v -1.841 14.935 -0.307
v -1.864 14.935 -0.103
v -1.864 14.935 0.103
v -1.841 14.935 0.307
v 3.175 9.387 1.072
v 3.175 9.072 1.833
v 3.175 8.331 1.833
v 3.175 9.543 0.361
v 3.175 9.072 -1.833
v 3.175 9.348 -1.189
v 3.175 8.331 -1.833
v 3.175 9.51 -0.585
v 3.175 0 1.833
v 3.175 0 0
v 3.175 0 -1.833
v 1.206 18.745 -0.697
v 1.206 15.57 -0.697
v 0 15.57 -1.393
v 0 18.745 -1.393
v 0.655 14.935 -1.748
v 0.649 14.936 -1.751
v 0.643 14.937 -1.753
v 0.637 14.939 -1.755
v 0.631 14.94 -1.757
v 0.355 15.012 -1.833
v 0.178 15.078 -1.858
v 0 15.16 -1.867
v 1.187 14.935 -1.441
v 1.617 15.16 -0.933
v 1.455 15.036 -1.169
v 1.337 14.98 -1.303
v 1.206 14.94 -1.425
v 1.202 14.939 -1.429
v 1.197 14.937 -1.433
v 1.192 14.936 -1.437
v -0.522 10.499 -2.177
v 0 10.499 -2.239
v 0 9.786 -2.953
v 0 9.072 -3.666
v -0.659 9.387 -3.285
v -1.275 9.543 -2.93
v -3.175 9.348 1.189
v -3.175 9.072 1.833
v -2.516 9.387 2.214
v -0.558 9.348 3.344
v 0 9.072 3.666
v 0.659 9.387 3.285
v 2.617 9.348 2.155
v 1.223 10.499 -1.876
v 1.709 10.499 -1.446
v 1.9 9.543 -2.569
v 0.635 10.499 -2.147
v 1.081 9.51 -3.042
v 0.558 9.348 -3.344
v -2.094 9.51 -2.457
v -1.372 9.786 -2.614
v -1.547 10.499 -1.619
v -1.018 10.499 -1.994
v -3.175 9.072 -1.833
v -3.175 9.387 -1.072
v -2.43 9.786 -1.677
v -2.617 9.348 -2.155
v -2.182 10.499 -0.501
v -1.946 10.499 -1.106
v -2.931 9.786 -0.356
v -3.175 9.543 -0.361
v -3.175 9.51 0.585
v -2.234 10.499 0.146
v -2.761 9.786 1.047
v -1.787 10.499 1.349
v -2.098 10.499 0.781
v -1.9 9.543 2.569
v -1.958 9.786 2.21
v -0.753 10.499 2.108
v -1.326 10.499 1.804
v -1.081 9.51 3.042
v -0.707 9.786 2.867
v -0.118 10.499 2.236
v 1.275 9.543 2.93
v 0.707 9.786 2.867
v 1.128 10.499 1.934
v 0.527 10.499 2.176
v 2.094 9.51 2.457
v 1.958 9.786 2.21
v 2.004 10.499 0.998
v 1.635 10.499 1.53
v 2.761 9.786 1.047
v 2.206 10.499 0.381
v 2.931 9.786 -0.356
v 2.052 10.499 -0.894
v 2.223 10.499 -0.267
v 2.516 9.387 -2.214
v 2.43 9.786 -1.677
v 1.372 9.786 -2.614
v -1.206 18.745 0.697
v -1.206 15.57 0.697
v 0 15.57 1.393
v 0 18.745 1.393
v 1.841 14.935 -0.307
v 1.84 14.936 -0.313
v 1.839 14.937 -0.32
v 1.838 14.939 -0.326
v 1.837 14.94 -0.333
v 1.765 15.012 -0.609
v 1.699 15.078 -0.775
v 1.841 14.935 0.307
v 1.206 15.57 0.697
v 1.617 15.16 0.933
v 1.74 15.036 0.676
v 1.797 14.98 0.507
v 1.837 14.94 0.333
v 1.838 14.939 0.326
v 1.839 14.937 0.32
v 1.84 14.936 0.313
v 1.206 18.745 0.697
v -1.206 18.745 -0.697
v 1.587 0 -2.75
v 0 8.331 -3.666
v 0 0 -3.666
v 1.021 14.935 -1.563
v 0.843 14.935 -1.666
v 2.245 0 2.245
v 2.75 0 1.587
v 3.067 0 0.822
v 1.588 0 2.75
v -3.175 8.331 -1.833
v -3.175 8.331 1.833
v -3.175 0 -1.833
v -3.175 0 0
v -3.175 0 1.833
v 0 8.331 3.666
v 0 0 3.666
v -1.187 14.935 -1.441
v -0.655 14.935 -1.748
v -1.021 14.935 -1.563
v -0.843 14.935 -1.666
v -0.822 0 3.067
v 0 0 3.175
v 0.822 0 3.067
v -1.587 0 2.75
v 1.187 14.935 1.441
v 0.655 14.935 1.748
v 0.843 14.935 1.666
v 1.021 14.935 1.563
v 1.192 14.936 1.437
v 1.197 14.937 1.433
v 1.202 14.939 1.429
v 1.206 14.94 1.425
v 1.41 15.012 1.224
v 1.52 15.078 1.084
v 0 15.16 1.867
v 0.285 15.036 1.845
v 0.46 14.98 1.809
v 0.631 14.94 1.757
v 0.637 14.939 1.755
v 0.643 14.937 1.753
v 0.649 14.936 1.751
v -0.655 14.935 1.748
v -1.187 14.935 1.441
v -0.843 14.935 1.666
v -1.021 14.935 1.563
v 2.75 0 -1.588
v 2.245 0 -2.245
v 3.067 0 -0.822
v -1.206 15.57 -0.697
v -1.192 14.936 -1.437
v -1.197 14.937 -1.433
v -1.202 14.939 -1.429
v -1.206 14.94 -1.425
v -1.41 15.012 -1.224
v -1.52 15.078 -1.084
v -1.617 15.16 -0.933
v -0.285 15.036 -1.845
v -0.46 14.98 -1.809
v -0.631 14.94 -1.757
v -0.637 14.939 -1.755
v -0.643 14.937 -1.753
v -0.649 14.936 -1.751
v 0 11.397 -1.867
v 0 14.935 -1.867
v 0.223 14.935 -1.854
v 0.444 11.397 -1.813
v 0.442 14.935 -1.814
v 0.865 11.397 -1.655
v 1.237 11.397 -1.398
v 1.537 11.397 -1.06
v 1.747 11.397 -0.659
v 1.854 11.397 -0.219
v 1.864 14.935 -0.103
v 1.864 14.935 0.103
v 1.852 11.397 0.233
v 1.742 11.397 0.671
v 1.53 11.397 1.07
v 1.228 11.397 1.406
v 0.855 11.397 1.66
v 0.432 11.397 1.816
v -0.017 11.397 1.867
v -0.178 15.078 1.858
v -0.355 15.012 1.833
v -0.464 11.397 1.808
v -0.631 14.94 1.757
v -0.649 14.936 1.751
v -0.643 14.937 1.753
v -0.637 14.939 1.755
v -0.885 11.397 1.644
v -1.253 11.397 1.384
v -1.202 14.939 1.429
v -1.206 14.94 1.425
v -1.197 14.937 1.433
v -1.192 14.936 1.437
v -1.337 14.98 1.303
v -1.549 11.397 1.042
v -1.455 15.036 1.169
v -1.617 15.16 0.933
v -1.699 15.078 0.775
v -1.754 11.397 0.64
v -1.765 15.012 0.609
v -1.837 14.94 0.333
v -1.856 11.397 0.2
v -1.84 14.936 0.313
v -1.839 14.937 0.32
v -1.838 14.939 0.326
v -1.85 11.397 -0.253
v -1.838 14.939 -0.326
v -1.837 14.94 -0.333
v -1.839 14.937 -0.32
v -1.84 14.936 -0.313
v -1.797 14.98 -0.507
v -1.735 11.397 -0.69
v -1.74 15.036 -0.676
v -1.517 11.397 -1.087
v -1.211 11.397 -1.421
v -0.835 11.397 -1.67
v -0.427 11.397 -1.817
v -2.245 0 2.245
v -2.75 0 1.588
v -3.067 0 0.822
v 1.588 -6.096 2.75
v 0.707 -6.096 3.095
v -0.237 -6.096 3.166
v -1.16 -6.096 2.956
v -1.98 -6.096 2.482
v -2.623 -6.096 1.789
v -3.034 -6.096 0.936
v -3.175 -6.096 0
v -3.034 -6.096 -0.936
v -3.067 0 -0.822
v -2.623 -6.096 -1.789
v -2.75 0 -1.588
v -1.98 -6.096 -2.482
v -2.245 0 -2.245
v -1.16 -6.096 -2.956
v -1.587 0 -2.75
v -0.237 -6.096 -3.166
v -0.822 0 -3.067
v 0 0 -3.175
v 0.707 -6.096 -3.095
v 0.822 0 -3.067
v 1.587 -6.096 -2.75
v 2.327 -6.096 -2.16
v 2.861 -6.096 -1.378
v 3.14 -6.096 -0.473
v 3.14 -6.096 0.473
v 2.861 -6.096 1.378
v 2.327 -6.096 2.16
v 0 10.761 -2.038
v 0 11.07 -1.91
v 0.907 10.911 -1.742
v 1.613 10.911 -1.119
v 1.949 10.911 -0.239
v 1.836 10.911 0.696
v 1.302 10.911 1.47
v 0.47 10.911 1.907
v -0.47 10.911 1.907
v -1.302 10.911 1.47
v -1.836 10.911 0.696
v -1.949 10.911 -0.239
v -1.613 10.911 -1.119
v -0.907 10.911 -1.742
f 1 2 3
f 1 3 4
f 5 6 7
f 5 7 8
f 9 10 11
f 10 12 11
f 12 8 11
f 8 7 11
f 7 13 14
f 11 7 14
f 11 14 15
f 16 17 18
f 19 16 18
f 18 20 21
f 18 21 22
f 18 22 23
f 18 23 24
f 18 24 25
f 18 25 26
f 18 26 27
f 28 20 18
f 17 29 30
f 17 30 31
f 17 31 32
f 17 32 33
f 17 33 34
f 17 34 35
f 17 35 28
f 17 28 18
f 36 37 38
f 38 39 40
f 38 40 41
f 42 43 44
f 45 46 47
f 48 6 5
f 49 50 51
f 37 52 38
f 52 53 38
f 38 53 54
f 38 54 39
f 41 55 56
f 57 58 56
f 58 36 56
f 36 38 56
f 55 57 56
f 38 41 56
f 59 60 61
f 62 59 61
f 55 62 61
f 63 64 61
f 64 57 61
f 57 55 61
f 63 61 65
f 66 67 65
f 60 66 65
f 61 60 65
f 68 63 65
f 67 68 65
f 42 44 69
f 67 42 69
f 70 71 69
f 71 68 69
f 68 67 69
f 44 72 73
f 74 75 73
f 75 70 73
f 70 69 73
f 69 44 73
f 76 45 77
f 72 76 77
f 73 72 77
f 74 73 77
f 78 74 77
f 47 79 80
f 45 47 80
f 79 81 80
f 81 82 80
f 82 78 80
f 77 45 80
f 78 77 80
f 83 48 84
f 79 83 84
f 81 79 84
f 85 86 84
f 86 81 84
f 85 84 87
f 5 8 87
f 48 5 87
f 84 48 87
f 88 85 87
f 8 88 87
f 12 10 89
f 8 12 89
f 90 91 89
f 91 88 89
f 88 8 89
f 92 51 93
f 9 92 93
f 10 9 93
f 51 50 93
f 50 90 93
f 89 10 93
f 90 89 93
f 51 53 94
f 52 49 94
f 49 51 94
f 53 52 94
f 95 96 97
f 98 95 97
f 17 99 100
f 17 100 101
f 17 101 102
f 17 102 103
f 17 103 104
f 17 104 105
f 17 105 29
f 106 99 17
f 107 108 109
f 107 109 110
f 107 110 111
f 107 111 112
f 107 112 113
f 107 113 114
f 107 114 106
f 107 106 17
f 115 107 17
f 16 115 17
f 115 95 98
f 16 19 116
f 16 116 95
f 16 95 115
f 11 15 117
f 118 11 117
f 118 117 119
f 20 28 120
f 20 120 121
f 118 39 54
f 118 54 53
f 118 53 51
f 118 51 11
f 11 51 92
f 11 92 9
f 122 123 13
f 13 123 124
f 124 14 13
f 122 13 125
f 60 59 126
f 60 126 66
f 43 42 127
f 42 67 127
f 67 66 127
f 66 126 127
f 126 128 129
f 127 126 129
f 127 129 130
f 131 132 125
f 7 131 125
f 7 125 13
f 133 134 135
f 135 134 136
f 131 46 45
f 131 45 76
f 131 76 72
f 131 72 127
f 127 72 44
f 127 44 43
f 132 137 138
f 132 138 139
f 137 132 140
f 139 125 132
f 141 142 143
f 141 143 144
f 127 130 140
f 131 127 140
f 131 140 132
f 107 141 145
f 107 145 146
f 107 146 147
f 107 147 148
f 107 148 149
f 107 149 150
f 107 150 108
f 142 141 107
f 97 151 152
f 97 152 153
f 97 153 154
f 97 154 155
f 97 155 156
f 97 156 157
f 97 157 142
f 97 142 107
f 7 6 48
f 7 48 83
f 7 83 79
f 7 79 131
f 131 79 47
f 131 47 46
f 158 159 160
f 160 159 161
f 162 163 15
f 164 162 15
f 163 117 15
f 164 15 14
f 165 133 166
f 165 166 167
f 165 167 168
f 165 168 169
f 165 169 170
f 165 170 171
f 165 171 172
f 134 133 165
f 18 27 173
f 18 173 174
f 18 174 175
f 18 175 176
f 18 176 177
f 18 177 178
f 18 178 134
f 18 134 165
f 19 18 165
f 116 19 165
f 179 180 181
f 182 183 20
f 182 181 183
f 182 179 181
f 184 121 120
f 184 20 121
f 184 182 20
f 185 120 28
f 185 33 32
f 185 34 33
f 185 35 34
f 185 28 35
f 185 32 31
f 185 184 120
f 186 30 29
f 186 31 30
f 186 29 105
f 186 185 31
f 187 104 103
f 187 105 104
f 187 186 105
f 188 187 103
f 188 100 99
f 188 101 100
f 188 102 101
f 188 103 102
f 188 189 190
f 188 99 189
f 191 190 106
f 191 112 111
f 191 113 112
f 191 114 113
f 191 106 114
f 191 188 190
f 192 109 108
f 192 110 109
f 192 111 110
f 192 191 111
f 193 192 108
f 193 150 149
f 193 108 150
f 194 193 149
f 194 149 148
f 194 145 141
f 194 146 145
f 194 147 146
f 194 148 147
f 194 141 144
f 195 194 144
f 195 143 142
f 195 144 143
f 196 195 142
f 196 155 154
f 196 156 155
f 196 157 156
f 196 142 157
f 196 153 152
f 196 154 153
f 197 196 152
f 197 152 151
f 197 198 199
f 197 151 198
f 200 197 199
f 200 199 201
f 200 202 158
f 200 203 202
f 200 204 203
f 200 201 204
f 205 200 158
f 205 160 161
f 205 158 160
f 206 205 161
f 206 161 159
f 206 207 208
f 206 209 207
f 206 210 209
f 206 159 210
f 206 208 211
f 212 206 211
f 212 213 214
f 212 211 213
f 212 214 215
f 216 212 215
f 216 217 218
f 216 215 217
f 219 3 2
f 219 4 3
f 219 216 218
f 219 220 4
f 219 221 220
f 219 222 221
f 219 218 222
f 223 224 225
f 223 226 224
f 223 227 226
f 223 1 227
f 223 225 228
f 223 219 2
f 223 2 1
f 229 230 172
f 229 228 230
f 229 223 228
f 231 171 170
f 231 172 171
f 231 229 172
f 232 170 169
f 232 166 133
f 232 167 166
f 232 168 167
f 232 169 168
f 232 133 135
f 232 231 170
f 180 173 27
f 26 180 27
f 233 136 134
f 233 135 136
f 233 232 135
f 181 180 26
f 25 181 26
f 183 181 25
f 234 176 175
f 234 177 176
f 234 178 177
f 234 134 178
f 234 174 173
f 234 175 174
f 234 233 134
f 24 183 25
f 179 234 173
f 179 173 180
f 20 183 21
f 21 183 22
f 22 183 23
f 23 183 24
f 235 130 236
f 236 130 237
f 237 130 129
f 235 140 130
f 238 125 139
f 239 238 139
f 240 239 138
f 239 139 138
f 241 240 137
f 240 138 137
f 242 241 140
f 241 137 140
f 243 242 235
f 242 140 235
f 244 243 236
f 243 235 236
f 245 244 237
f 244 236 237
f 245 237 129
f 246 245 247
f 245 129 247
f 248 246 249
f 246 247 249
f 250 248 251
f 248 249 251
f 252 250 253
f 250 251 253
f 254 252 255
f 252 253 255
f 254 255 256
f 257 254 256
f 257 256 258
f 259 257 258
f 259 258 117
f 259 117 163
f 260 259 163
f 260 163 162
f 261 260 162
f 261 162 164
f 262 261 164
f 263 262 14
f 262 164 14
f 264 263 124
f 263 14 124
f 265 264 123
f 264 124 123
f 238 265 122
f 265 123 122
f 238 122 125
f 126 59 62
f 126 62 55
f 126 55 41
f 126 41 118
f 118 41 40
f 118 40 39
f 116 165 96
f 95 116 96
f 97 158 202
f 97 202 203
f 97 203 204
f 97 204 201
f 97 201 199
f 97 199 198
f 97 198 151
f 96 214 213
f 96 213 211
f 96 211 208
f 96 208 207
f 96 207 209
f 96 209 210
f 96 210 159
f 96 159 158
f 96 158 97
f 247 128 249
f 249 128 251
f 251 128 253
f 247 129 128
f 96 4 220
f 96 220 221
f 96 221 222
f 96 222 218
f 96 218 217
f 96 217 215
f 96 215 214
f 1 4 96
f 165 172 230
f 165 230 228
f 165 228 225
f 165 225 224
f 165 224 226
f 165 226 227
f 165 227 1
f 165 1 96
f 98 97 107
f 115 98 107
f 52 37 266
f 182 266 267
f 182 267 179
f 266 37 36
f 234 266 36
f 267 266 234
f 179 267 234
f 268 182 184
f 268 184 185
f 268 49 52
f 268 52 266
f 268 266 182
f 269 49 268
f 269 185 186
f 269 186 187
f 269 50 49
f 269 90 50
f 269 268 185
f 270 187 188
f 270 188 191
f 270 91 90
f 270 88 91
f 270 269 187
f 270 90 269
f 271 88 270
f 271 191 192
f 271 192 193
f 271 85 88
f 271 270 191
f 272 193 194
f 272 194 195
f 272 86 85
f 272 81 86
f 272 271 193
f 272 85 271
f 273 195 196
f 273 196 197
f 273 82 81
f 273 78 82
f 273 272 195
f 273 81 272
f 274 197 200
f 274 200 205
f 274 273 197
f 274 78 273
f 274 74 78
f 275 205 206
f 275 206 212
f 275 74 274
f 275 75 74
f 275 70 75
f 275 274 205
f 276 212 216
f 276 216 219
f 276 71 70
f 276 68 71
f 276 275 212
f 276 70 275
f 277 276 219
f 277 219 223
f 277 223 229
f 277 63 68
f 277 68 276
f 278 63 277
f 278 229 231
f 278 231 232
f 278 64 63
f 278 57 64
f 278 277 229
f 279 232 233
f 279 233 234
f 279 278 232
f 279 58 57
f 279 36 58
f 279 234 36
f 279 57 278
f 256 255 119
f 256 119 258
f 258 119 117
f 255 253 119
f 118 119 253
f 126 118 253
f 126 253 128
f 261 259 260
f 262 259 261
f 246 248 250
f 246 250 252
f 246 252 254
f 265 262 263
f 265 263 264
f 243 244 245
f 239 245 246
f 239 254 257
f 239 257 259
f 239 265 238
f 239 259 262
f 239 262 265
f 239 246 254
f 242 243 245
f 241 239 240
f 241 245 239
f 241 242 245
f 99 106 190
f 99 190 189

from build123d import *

# Parameters (mm, degrees)
BOSS_EXTRUDE1_DEPTH = 8.3312
SKETCH2_R           = 3.175
BOSS_EXTRUDE2_DEPTH = 6.096
SKETCH3_R           = 1.8669
BOSS_EXTRUDE3_DEPTH = 6.604
BOSS_EXTRUDE4_DEPTH = 3.81
CHAMFER1_SIZE       = 0.635
FILLET2_R           = 1.27


with BuildPart() as part:
    # Sketch1 → Boss-Extrude1 (new body)
    with BuildSketch(Plane(origin=(0, 0, 0), x_dir=(1, 0, 0), z_dir=(0, 1, 0))):
        Polygon((0, 3.666174209), (-3.175, 1.833087105), (-3.175, -1.833087105), (0, -3.666174209), (3.175, -1.833087105), (3.175, 1.833087105), align=None)
    extrude(amount=BOSS_EXTRUDE1_DEPTH)

    # Sketch2 → Boss-Extrude2 (add)
    with BuildSketch(Plane.XZ):
        with Locations(Location((0, 0, 0), (0, 0, 60))):
            Circle(SKETCH2_R)
    extrude(amount=BOSS_EXTRUDE2_DEPTH)

    # Sketch3 → Boss-Extrude3 (add)
    with BuildSketch(Plane(origin=(0, 8.3312, 0), x_dir=(1, 0, 0), z_dir=(0, 1, 0))):
        with Locations(Location((0, 0, 0), (0, 0, 90))):
            Circle(SKETCH3_R)
    extrude(amount=BOSS_EXTRUDE3_DEPTH)

    # Sketch4 → Boss-Extrude4 (add)
    with BuildSketch(Plane(origin=(0, 14.9352, 0), x_dir=(1, 0, 0), z_dir=(0, 1, 0))):
        Polygon((0, 1.3931462), (-1.2065, 0.6965731), (-1.2065, -0.6965731), (0, -1.3931462), (1.2065, -0.6965731), (1.2065, 0.6965731), align=None)
    extrude(amount=BOSS_EXTRUDE4_DEPTH)

    # Chamfer1
    # the kernel refuses this chamfer: 0.635 mm, written as the material it adds along each edge
    with BuildSketch(Plane(origin=(2.620735677, 14.9352, 0.119936249), x_dir=(0.4998109584556484, -0.027495876610587288, -0.8656979742248804), z_dir=(-0.8660254037844387, 0, -0.5000000000000001))) as chamfer1_piece_1_section:
        Polygon((CHAMFER1_SIZE * 0.999621916911, -CHAMFER1_SIZE * 0.0274958766106), (-CHAMFER1_SIZE * 0.0274958766106, -CHAMFER1_SIZE * 0.999621916911), (0, 0), align=None)
    chamfer1_piece_1 = extrude(amount=4.659183594, mode=Mode.PRIVATE)
    chamfer1_piece_1 = chamfer1_piece_1 & Plane(origin=(0, 15.158402941, 0), x_dir=(0, 0, -1), z_dir=(0, -1, 0)) * Cylinder(1.8669, 12, mode=Mode.PRIVATE)
    chamfer1_piece_1 = split(chamfer1_piece_1, bisect_by=Plane(origin=(0.439350473, 15.158402941, -1.646805313), z_dir=(0.49999999999999967, 0, 0.8660254037844388)), keep=Keep.TOP, mode=Mode.PRIVATE)
    chamfer1_piece_1 = split(chamfer1_piece_1, bisect_by=Plane(origin=(1.2065, 15.158402941, -1.203891328), z_dir=(-1, 0, 0)), keep=Keep.TOP, mode=Mode.PRIVATE)
    add(chamfer1_piece_1)
    with BuildSketch(Plane(origin=(1.414235677, 14.9352, -2.209655548), x_dir=(-0.49981095845564805, -0.02749587661058727, -0.8656979742248805), z_dir=(-0.8660254037844388, 0, 0.49999999999999967))) as chamfer1_piece_2_section:
        Polygon((CHAMFER1_SIZE * 0.999621916911, -CHAMFER1_SIZE * 0.0274958766106), (-CHAMFER1_SIZE * 0.0274958766106, -CHAMFER1_SIZE * 0.999621916911), (0, 0), align=None)
    chamfer1_piece_2 = extrude(amount=4.659183594, mode=Mode.PRIVATE)
    chamfer1_piece_2 = chamfer1_piece_2 & Plane(origin=(0, 15.158402941, 0), x_dir=(0, 0, -1), z_dir=(0, -1, 0)) * Cylinder(1.8669, 12, mode=Mode.PRIVATE)
    chamfer1_piece_2 = split(chamfer1_piece_2, bisect_by=Plane(origin=(-0.439350472, 15.158402941, -1.646805313), z_dir=(-0.5000000000000001, 0, 0.8660254037844387)), keep=Keep.TOP, mode=Mode.PRIVATE)
    chamfer1_piece_2 = split(chamfer1_piece_2, bisect_by=Plane(origin=(-1.2065, 15.158402941, -1.203891327), z_dir=(1, 0, 0)), keep=Keep.TOP, mode=Mode.PRIVATE)
    add(chamfer1_piece_2)
    with BuildSketch(Plane(origin=(-1.2065, 14.9352, -2.329591797), x_dir=(-0.9996219169112968, -0.027495876610587288, 0), z_dir=(0, 0, 1))) as chamfer1_piece_3_section:
        Polygon((CHAMFER1_SIZE * 0.999621916911, -CHAMFER1_SIZE * 0.0274958766106), (-CHAMFER1_SIZE * 0.0274958766106, -CHAMFER1_SIZE * 0.999621916911), (0, 0), align=None)
    chamfer1_piece_3 = extrude(amount=4.659183594, mode=Mode.PRIVATE)
    chamfer1_piece_3 = chamfer1_piece_3 & Plane(origin=(0, 15.158402941, 0), x_dir=(0, 0, -1), z_dir=(0, -1, 0)) * Cylinder(1.8669, 12, mode=Mode.PRIVATE)
    chamfer1_piece_3 = split(chamfer1_piece_3, bisect_by=Plane(origin=(-1.645850473, 15.158402941, -0.442913986), z_dir=(0.49999999999999967, 0, 0.8660254037844388)), keep=Keep.TOP, mode=Mode.PRIVATE)
    chamfer1_piece_3 = split(chamfer1_piece_3, bisect_by=Plane(origin=(-1.645850472, 15.158402941, 0.442913986), z_dir=(0.5000000000000001, 0, -0.8660254037844386)), keep=Keep.TOP, mode=Mode.PRIVATE)
    add(chamfer1_piece_3)
    with BuildSketch(Plane(origin=(-2.620735677, 14.9352, -0.119936249), x_dir=(-0.4998109584556485, -0.027495876610587288, 0.8656979742248802), z_dir=(0.8660254037844386, 0, 0.5000000000000001))) as chamfer1_piece_4_section:
        Polygon((CHAMFER1_SIZE * 0.999621916911, -CHAMFER1_SIZE * 0.0274958766106), (-CHAMFER1_SIZE * 0.0274958766106, -CHAMFER1_SIZE * 0.999621916911), (0, 0), align=None)
    chamfer1_piece_4 = extrude(amount=4.659183594, mode=Mode.PRIVATE)
    chamfer1_piece_4 = chamfer1_piece_4 & Plane(origin=(0, 15.158402941, 0), x_dir=(0, 0, -1), z_dir=(0, -1, 0)) * Cylinder(1.8669, 12, mode=Mode.PRIVATE)
    chamfer1_piece_4 = split(chamfer1_piece_4, bisect_by=Plane(origin=(-1.2065, 15.158402941, 1.203891327), z_dir=(1, 0, 0)), keep=Keep.TOP, mode=Mode.PRIVATE)
    chamfer1_piece_4 = split(chamfer1_piece_4, bisect_by=Plane(origin=(-0.439350472, 15.158402941, 1.646805313), z_dir=(-0.4999999999999998, 0, -0.8660254037844388)), keep=Keep.TOP, mode=Mode.PRIVATE)
    add(chamfer1_piece_4)
    with BuildSketch(Plane(origin=(-1.414235677, 14.9352, 2.209655548), x_dir=(0.49981095845564816, -0.02749587661058727, 0.8656979742248805), z_dir=(0.8660254037844388, 0, -0.4999999999999998))) as chamfer1_piece_5_section:
        Polygon((CHAMFER1_SIZE * 0.999621916911, -CHAMFER1_SIZE * 0.0274958766106), (-CHAMFER1_SIZE * 0.0274958766106, -CHAMFER1_SIZE * 0.999621916911), (0, 0), align=None)
    chamfer1_piece_5 = extrude(amount=4.659183594, mode=Mode.PRIVATE)
    chamfer1_piece_5 = chamfer1_piece_5 & Plane(origin=(0, 15.158402941, 0), x_dir=(0, 0, -1), z_dir=(0, -1, 0)) * Cylinder(1.8669, 12, mode=Mode.PRIVATE)
    chamfer1_piece_5 = split(chamfer1_piece_5, bisect_by=Plane(origin=(0.439350473, 15.158402941, 1.646805313), z_dir=(0.5000000000000001, 0, -0.8660254037844386)), keep=Keep.TOP, mode=Mode.PRIVATE)
    chamfer1_piece_5 = split(chamfer1_piece_5, bisect_by=Plane(origin=(1.2065, 15.158402941, 1.203891327), z_dir=(-1, 0, 0)), keep=Keep.TOP, mode=Mode.PRIVATE)
    add(chamfer1_piece_5)
    with BuildSketch(Plane(origin=(1.2065, 14.9352, 2.329591797), x_dir=(0.9996219169112968, -0.027495876610587288, 0), z_dir=(0, 0, -1))) as chamfer1_piece_6_section:
        Polygon((CHAMFER1_SIZE * 0.999621916911, -CHAMFER1_SIZE * 0.0274958766106), (-CHAMFER1_SIZE * 0.0274958766106, -CHAMFER1_SIZE * 0.999621916911), (0, 0), align=None)
    chamfer1_piece_6 = extrude(amount=4.659183594, mode=Mode.PRIVATE)
    chamfer1_piece_6 = chamfer1_piece_6 & Plane(origin=(0, 15.158402941, 0), x_dir=(0, 0, -1), z_dir=(0, -1, 0)) * Cylinder(1.8669, 12, mode=Mode.PRIVATE)
    chamfer1_piece_6 = split(chamfer1_piece_6, bisect_by=Plane(origin=(1.645850473, 15.158402941, 0.442913986), z_dir=(-0.4999999999999998, 0, -0.8660254037844388)), keep=Keep.TOP, mode=Mode.PRIVATE)
    chamfer1_piece_6 = split(chamfer1_piece_6, bisect_by=Plane(origin=(1.645850472, 15.158402941, -0.442913986), z_dir=(-0.5000000000000001, 0, 0.8660254037844387)), keep=Keep.TOP, mode=Mode.PRIVATE)
    add(chamfer1_piece_6)
    with BuildSketch(Plane(origin=(1.2065, 14.9352, 2.329591797), x_dir=(0.9996219169112968, -0.027495876610587288, 0), z_dir=(0, 0, -1))) as chamfer1_piece_7a_section:
        Polygon((CHAMFER1_SIZE * 0.999621916911, -CHAMFER1_SIZE * 0.0274958766106), (-CHAMFER1_SIZE * 0.0274958766106, -CHAMFER1_SIZE * 0.999621916911), (0, 0), align=None)
    chamfer1_piece_7a = extrude(amount=4.659183594, mode=Mode.PRIVATE)
    chamfer1_piece_7a = chamfer1_piece_7a & Plane(origin=(0, 15.161928265, 0), x_dir=(0, 0, -1), z_dir=(0, -1, 0)) * Cylinder(1.8669, 12, mode=Mode.PRIVATE)
    chamfer1_piece_7a = split(chamfer1_piece_7a, bisect_by=Plane(origin=(1.244933629, 15.161928265, -0.674383434), z_dir=(0.5000000000000001, 0, -0.8660254037844387)), keep=Keep.TOP, mode=Mode.PRIVATE)
    with BuildSketch(Plane(origin=(2.620735677, 14.9352, 0.119936249), x_dir=(0.4998109584556484, -0.027495876610587288, -0.8656979742248804), z_dir=(-0.8660254037844387, 0, -0.5000000000000001))) as chamfer1_piece_7b_section:
        Polygon((CHAMFER1_SIZE * 0.999621916911, -CHAMFER1_SIZE * 0.0274958766106), (-CHAMFER1_SIZE * 0.0274958766106, -CHAMFER1_SIZE * 0.999621916911), (0, 0), align=None)
    chamfer1_piece_7b = extrude(amount=4.659183594, mode=Mode.PRIVATE)
    chamfer1_piece_7b = chamfer1_piece_7b & Plane(origin=(0, 15.161928264, 0), x_dir=(0, 0, -1), z_dir=(0, -1, 0)) * Cylinder(1.8669, 12, mode=Mode.PRIVATE)
    chamfer1_piece_7b = split(chamfer1_piece_7b, bisect_by=Plane(origin=(1.2065, 15.161928264, -0.740952419), z_dir=(1, 0, 0)), keep=Keep.TOP, mode=Mode.PRIVATE)
    chamfer1_piece_7 = chamfer1_piece_7a & chamfer1_piece_7b
    add(chamfer1_piece_7)
    with BuildSketch(Plane(origin=(1.414235677, 14.9352, -2.209655548), x_dir=(-0.49981095845564805, -0.02749587661058727, -0.8656979742248805), z_dir=(-0.8660254037844388, 0, 0.49999999999999967))) as chamfer1_piece_8a_section:
        Polygon((CHAMFER1_SIZE * 0.999621916911, -CHAMFER1_SIZE * 0.0274958766106), (-CHAMFER1_SIZE * 0.0274958766106, -CHAMFER1_SIZE * 0.999621916911), (0, 0), align=None)
    chamfer1_piece_8a = extrude(amount=4.659183594, mode=Mode.PRIVATE)
    chamfer1_piece_8a = chamfer1_piece_8a & Plane(origin=(0, 15.161928254, 0), x_dir=(0, 0, -1), z_dir=(0, -1, 0)) * Cylinder(1.8669, 12, mode=Mode.PRIVATE)
    chamfer1_piece_8a = split(chamfer1_piece_8a, bisect_by=Plane(origin=(-0.038433634, 15.161928254, -1.415335868), z_dir=(0.5000000000000001, 0, -0.8660254037844387)), keep=Keep.TOP, mode=Mode.PRIVATE)
    with BuildSketch(Plane(origin=(2.620735677, 14.9352, 0.119936249), x_dir=(0.4998109584556484, -0.027495876610587288, -0.8656979742248804), z_dir=(-0.8660254037844387, 0, -0.5000000000000001))) as chamfer1_piece_8b_section:
        Polygon((CHAMFER1_SIZE * 0.999621916911, -CHAMFER1_SIZE * 0.0274958766106), (-CHAMFER1_SIZE * 0.0274958766106, -CHAMFER1_SIZE * 0.999621916911), (0, 0), align=None)
    chamfer1_piece_8b = extrude(amount=4.659183594, mode=Mode.PRIVATE)
    chamfer1_piece_8b = chamfer1_piece_8b & Plane(origin=(0, 15.16192826, 0), x_dir=(0, 0, -1), z_dir=(0, -1, 0)) * Cylinder(1.8669, 12, mode=Mode.PRIVATE)
    chamfer1_piece_8b = split(chamfer1_piece_8b, bisect_by=Plane(origin=(0.038433624, 15.16192826, -1.415335863), z_dir=(-0.49999999999999967, 0, -0.8660254037844388)), keep=Keep.TOP, mode=Mode.PRIVATE)
    chamfer1_piece_8 = chamfer1_piece_8a & chamfer1_piece_8b
    add(chamfer1_piece_8)
    with BuildSketch(Plane(origin=(1.414235677, 14.9352, -2.209655548), x_dir=(-0.49981095845564805, -0.02749587661058727, -0.8656979742248805), z_dir=(-0.8660254037844388, 0, 0.49999999999999967))) as chamfer1_piece_9a_section:
        Polygon((CHAMFER1_SIZE * 0.999621916911, -CHAMFER1_SIZE * 0.0274958766106), (-CHAMFER1_SIZE * 0.0274958766106, -CHAMFER1_SIZE * 0.999621916911), (0, 0), align=None)
    chamfer1_piece_9a = extrude(amount=4.659183594, mode=Mode.PRIVATE)
    chamfer1_piece_9a = chamfer1_piece_9a & Plane(origin=(0, 15.161928258, 0), x_dir=(0, 0, -1), z_dir=(0, -1, 0)) * Cylinder(1.8669, 12, mode=Mode.PRIVATE)
    chamfer1_piece_9a = split(chamfer1_piece_9a, bisect_by=Plane(origin=(-1.2065, 15.161928258, -0.740952435), z_dir=(-1, 0, 0)), keep=Keep.TOP, mode=Mode.PRIVATE)
    with BuildSketch(Plane(origin=(-1.2065, 14.9352, -2.329591797), x_dir=(-0.9996219169112968, -0.027495876610587288, 0), z_dir=(0, 0, 1))) as chamfer1_piece_9b_section:
        Polygon((CHAMFER1_SIZE * 0.999621916911, -CHAMFER1_SIZE * 0.0274958766106), (-CHAMFER1_SIZE * 0.0274958766106, -CHAMFER1_SIZE * 0.999621916911), (0, 0), align=None)
    chamfer1_piece_9b = extrude(amount=4.659183594, mode=Mode.PRIVATE)
    chamfer1_piece_9b = chamfer1_piece_9b & Plane(origin=(0, 15.161928252, 0), x_dir=(0, 0, -1), z_dir=(0, -1, 0)) * Cylinder(1.8669, 12, mode=Mode.PRIVATE)
    chamfer1_piece_9b = split(chamfer1_piece_9b, bisect_by=Plane(origin=(-1.244933623, 15.161928252, -0.674383437), z_dir=(-0.49999999999999967, 0, -0.8660254037844388)), keep=Keep.TOP, mode=Mode.PRIVATE)
    chamfer1_piece_9 = chamfer1_piece_9a & chamfer1_piece_9b
    add(chamfer1_piece_9)
    with BuildSketch(Plane(origin=(-1.2065, 14.9352, -2.329591797), x_dir=(-0.9996219169112968, -0.027495876610587288, 0), z_dir=(0, 0, 1))) as chamfer1_piece_10a_section:
        Polygon((CHAMFER1_SIZE * 0.999621916911, -CHAMFER1_SIZE * 0.0274958766106), (-CHAMFER1_SIZE * 0.0274958766106, -CHAMFER1_SIZE * 0.999621916911), (0, 0), align=None)
    chamfer1_piece_10a = extrude(amount=4.659183594, mode=Mode.PRIVATE)
    chamfer1_piece_10a = chamfer1_piece_10a & Plane(origin=(0, 15.161928265, 0), x_dir=(0, 0, -1), z_dir=(0, -1, 0)) * Cylinder(1.8669, 12, mode=Mode.PRIVATE)
    chamfer1_piece_10a = split(chamfer1_piece_10a, bisect_by=Plane(origin=(-1.244933629, 15.161928265, 0.674383434), z_dir=(-0.5000000000000001, 0, 0.8660254037844386)), keep=Keep.TOP, mode=Mode.PRIVATE)
    with BuildSketch(Plane(origin=(-2.620735677, 14.9352, -0.119936249), x_dir=(-0.4998109584556485, -0.027495876610587288, 0.8656979742248802), z_dir=(0.8660254037844386, 0, 0.5000000000000001))) as chamfer1_piece_10b_section:
        Polygon((CHAMFER1_SIZE * 0.999621916911, -CHAMFER1_SIZE * 0.0274958766106), (-CHAMFER1_SIZE * 0.0274958766106, -CHAMFER1_SIZE * 0.999621916911), (0, 0), align=None)
    chamfer1_piece_10b = extrude(amount=4.659183594, mode=Mode.PRIVATE)
    chamfer1_piece_10b = chamfer1_piece_10b & Plane(origin=(0, 15.161928252, 0), x_dir=(0, 0, -1), z_dir=(0, -1, 0)) * Cylinder(1.8669, 12, mode=Mode.PRIVATE)
    chamfer1_piece_10b = split(chamfer1_piece_10b, bisect_by=Plane(origin=(-1.2065, 15.161928252, 0.740952425), z_dir=(-1, 0, 0)), keep=Keep.TOP, mode=Mode.PRIVATE)
    chamfer1_piece_10 = chamfer1_piece_10a & chamfer1_piece_10b
    add(chamfer1_piece_10)
    with BuildSketch(Plane(origin=(-2.620735677, 14.9352, -0.119936249), x_dir=(-0.4998109584556485, -0.027495876610587288, 0.8656979742248802), z_dir=(0.8660254037844386, 0, 0.5000000000000001))) as chamfer1_piece_11a_section:
        Polygon((CHAMFER1_SIZE * 0.999621916911, -CHAMFER1_SIZE * 0.0274958766106), (-CHAMFER1_SIZE * 0.0274958766106, -CHAMFER1_SIZE * 0.999621916911), (0, 0), align=None)
    chamfer1_piece_11a = extrude(amount=4.659183594, mode=Mode.PRIVATE)
    chamfer1_piece_11a = chamfer1_piece_11a & Plane(origin=(0, 15.161928264, 0), x_dir=(0, 0, -1), z_dir=(0, -1, 0)) * Cylinder(1.8669, 12, mode=Mode.PRIVATE)
    chamfer1_piece_11a = split(chamfer1_piece_11a, bisect_by=Plane(origin=(-0.038433629, 15.161928264, 1.415335866), z_dir=(0.4999999999999998, 0, 0.8660254037844388)), keep=Keep.TOP, mode=Mode.PRIVATE)
    with BuildSketch(Plane(origin=(-1.414235677, 14.9352, 2.209655548), x_dir=(0.49981095845564816, -0.02749587661058727, 0.8656979742248805), z_dir=(0.8660254037844388, 0, -0.4999999999999998))) as chamfer1_piece_11b_section:
        Polygon((CHAMFER1_SIZE * 0.999621916911, -CHAMFER1_SIZE * 0.0274958766106), (-CHAMFER1_SIZE * 0.0274958766106, -CHAMFER1_SIZE * 0.999621916911), (0, 0), align=None)
    chamfer1_piece_11b = extrude(amount=4.659183594, mode=Mode.PRIVATE)
    chamfer1_piece_11b = chamfer1_piece_11b & Plane(origin=(0, 15.161928252, 0), x_dir=(0, 0, -1), z_dir=(0, -1, 0)) * Cylinder(1.8669, 12, mode=Mode.PRIVATE)
    chamfer1_piece_11b = split(chamfer1_piece_11b, bisect_by=Plane(origin=(0.038433623, 15.161928252, 1.415335862), z_dir=(-0.5000000000000001, 0, 0.8660254037844386)), keep=Keep.TOP, mode=Mode.PRIVATE)
    chamfer1_piece_11 = chamfer1_piece_11a & chamfer1_piece_11b
    add(chamfer1_piece_11)
    with BuildSketch(Plane(origin=(-1.414235677, 14.9352, 2.209655548), x_dir=(0.49981095845564816, -0.02749587661058727, 0.8656979742248805), z_dir=(0.8660254037844388, 0, -0.4999999999999998))) as chamfer1_piece_12a_section:
        Polygon((CHAMFER1_SIZE * 0.999621916911, -CHAMFER1_SIZE * 0.0274958766106), (-CHAMFER1_SIZE * 0.0274958766106, -CHAMFER1_SIZE * 0.999621916911), (0, 0), align=None)
    chamfer1_piece_12a = extrude(amount=4.659183594, mode=Mode.PRIVATE)
    chamfer1_piece_12a = chamfer1_piece_12a & Plane(origin=(0, 15.161928264, 0), x_dir=(0, 0, -1), z_dir=(0, -1, 0)) * Cylinder(1.8669, 12, mode=Mode.PRIVATE)
    chamfer1_piece_12a = split(chamfer1_piece_12a, bisect_by=Plane(origin=(1.2065, 15.161928264, 0.740952432), z_dir=(1, 0, 0)), keep=Keep.TOP, mode=Mode.PRIVATE)
    with BuildSketch(Plane(origin=(1.2065, 14.9352, 2.329591797), x_dir=(0.9996219169112968, -0.027495876610587288, 0), z_dir=(0, 0, -1))) as chamfer1_piece_12b_section:
        Polygon((CHAMFER1_SIZE * 0.999621916911, -CHAMFER1_SIZE * 0.0274958766106), (-CHAMFER1_SIZE * 0.0274958766106, -CHAMFER1_SIZE * 0.999621916911), (0, 0), align=None)
    chamfer1_piece_12b = extrude(amount=4.659183594, mode=Mode.PRIVATE)
    chamfer1_piece_12b = chamfer1_piece_12b & Plane(origin=(0, 15.161928252, 0), x_dir=(0, 0, -1), z_dir=(0, -1, 0)) * Cylinder(1.8669, 12, mode=Mode.PRIVATE)
    chamfer1_piece_12b = split(chamfer1_piece_12b, bisect_by=Plane(origin=(1.244933623, 15.161928252, 0.674383437), z_dir=(0.4999999999999998, 0, 0.8660254037844388)), keep=Keep.TOP, mode=Mode.PRIVATE)
    chamfer1_piece_12 = chamfer1_piece_12a & chamfer1_piece_12b
    add(chamfer1_piece_12)

    # Chamfer2
    # the kernel refuses this chamfer: 2.54 mm, written as the material it adds along each edge
    with BuildSketch(Plane(origin=(0, 8.3312, 0), x_dir=(0, 0, -1), z_dir=(1, 0, 0))) as chamfer2_piece_1_section:
        with BuildLine():
            Line((1.795057951, 2.611842049), (4.478742049, -0.071842049))
            Line((4.478742049, -0.071842049), (4.478742049, -0.122642049))
            ThreePointArc((4.478742049, -0.122642049), (3.172821024, -0.0508), (1.8669, -0.0508))
            Line((1.8669, -0.0508), (1.8161, 0))
            ThreePointArc((1.8161, 0), (1.8161, 1.305921024), (1.744257951, 2.611842049))
            Line((1.744257951, 2.611842049), (1.795057951, 2.611842049))
        make_face()
    chamfer2_piece_1 = revolve(axis=Axis((0, 8.3312, 0), (0, 1, 0)), mode=Mode.PRIVATE)
    chamfer2_piece_1 = split(chamfer2_piece_1, bisect_by=Plane(origin=(-2.759048579, 9.982443388, -2.07323677), z_dir=(0.4999999999999998, 0, 0.8660254037844388)), keep=Keep.TOP, mode=Mode.PRIVATE)
    chamfer2_piece_1 = split(chamfer2_piece_1, bisect_by=Plane(origin=(2.759048579, 9.982443388, -2.07323677), z_dir=(-0.5000000000000001, 0, 0.8660254037844386)), keep=Keep.TOP, mode=Mode.PRIVATE)
    chamfer2_piece_1 = split(chamfer2_piece_1, bisect_by=Plane(origin=(-3.175, 9.982443388, 2.705575549), z_dir=(1, 0, 0)), keep=Keep.TOP, mode=Mode.PRIVATE)
    chamfer2_piece_1 = split(chamfer2_piece_1, bisect_by=Plane(origin=(3.175, 9.982443388, 2.705575549), z_dir=(-1, 0, 0)), keep=Keep.TOP, mode=Mode.PRIVATE)
    chamfer2_piece_1 = split(chamfer2_piece_1, bisect_by=Plane(origin=(-0.415951421, 9.982443388, 3.426024544), z_dir=(0.5000000000000001, 0, -0.8660254037844386)), keep=Keep.TOP, mode=Mode.PRIVATE)
    chamfer2_piece_1 = split(chamfer2_piece_1, bisect_by=Plane(origin=(0.415951421, 9.982443388, 3.426024544), z_dir=(-0.5000000000000001, 0, -0.8660254037844386)), keep=Keep.TOP, mode=Mode.PRIVATE)
    add(chamfer2_piece_1)

    # Fillet2
    fillet2_edges = [part.edges().sort_by_distance(p)[0] for p in [
        (0, 10.8712, 1.8669),
    ]]
    fillet(fillet2_edges, radius=FILLET2_R)


solid = part.part
